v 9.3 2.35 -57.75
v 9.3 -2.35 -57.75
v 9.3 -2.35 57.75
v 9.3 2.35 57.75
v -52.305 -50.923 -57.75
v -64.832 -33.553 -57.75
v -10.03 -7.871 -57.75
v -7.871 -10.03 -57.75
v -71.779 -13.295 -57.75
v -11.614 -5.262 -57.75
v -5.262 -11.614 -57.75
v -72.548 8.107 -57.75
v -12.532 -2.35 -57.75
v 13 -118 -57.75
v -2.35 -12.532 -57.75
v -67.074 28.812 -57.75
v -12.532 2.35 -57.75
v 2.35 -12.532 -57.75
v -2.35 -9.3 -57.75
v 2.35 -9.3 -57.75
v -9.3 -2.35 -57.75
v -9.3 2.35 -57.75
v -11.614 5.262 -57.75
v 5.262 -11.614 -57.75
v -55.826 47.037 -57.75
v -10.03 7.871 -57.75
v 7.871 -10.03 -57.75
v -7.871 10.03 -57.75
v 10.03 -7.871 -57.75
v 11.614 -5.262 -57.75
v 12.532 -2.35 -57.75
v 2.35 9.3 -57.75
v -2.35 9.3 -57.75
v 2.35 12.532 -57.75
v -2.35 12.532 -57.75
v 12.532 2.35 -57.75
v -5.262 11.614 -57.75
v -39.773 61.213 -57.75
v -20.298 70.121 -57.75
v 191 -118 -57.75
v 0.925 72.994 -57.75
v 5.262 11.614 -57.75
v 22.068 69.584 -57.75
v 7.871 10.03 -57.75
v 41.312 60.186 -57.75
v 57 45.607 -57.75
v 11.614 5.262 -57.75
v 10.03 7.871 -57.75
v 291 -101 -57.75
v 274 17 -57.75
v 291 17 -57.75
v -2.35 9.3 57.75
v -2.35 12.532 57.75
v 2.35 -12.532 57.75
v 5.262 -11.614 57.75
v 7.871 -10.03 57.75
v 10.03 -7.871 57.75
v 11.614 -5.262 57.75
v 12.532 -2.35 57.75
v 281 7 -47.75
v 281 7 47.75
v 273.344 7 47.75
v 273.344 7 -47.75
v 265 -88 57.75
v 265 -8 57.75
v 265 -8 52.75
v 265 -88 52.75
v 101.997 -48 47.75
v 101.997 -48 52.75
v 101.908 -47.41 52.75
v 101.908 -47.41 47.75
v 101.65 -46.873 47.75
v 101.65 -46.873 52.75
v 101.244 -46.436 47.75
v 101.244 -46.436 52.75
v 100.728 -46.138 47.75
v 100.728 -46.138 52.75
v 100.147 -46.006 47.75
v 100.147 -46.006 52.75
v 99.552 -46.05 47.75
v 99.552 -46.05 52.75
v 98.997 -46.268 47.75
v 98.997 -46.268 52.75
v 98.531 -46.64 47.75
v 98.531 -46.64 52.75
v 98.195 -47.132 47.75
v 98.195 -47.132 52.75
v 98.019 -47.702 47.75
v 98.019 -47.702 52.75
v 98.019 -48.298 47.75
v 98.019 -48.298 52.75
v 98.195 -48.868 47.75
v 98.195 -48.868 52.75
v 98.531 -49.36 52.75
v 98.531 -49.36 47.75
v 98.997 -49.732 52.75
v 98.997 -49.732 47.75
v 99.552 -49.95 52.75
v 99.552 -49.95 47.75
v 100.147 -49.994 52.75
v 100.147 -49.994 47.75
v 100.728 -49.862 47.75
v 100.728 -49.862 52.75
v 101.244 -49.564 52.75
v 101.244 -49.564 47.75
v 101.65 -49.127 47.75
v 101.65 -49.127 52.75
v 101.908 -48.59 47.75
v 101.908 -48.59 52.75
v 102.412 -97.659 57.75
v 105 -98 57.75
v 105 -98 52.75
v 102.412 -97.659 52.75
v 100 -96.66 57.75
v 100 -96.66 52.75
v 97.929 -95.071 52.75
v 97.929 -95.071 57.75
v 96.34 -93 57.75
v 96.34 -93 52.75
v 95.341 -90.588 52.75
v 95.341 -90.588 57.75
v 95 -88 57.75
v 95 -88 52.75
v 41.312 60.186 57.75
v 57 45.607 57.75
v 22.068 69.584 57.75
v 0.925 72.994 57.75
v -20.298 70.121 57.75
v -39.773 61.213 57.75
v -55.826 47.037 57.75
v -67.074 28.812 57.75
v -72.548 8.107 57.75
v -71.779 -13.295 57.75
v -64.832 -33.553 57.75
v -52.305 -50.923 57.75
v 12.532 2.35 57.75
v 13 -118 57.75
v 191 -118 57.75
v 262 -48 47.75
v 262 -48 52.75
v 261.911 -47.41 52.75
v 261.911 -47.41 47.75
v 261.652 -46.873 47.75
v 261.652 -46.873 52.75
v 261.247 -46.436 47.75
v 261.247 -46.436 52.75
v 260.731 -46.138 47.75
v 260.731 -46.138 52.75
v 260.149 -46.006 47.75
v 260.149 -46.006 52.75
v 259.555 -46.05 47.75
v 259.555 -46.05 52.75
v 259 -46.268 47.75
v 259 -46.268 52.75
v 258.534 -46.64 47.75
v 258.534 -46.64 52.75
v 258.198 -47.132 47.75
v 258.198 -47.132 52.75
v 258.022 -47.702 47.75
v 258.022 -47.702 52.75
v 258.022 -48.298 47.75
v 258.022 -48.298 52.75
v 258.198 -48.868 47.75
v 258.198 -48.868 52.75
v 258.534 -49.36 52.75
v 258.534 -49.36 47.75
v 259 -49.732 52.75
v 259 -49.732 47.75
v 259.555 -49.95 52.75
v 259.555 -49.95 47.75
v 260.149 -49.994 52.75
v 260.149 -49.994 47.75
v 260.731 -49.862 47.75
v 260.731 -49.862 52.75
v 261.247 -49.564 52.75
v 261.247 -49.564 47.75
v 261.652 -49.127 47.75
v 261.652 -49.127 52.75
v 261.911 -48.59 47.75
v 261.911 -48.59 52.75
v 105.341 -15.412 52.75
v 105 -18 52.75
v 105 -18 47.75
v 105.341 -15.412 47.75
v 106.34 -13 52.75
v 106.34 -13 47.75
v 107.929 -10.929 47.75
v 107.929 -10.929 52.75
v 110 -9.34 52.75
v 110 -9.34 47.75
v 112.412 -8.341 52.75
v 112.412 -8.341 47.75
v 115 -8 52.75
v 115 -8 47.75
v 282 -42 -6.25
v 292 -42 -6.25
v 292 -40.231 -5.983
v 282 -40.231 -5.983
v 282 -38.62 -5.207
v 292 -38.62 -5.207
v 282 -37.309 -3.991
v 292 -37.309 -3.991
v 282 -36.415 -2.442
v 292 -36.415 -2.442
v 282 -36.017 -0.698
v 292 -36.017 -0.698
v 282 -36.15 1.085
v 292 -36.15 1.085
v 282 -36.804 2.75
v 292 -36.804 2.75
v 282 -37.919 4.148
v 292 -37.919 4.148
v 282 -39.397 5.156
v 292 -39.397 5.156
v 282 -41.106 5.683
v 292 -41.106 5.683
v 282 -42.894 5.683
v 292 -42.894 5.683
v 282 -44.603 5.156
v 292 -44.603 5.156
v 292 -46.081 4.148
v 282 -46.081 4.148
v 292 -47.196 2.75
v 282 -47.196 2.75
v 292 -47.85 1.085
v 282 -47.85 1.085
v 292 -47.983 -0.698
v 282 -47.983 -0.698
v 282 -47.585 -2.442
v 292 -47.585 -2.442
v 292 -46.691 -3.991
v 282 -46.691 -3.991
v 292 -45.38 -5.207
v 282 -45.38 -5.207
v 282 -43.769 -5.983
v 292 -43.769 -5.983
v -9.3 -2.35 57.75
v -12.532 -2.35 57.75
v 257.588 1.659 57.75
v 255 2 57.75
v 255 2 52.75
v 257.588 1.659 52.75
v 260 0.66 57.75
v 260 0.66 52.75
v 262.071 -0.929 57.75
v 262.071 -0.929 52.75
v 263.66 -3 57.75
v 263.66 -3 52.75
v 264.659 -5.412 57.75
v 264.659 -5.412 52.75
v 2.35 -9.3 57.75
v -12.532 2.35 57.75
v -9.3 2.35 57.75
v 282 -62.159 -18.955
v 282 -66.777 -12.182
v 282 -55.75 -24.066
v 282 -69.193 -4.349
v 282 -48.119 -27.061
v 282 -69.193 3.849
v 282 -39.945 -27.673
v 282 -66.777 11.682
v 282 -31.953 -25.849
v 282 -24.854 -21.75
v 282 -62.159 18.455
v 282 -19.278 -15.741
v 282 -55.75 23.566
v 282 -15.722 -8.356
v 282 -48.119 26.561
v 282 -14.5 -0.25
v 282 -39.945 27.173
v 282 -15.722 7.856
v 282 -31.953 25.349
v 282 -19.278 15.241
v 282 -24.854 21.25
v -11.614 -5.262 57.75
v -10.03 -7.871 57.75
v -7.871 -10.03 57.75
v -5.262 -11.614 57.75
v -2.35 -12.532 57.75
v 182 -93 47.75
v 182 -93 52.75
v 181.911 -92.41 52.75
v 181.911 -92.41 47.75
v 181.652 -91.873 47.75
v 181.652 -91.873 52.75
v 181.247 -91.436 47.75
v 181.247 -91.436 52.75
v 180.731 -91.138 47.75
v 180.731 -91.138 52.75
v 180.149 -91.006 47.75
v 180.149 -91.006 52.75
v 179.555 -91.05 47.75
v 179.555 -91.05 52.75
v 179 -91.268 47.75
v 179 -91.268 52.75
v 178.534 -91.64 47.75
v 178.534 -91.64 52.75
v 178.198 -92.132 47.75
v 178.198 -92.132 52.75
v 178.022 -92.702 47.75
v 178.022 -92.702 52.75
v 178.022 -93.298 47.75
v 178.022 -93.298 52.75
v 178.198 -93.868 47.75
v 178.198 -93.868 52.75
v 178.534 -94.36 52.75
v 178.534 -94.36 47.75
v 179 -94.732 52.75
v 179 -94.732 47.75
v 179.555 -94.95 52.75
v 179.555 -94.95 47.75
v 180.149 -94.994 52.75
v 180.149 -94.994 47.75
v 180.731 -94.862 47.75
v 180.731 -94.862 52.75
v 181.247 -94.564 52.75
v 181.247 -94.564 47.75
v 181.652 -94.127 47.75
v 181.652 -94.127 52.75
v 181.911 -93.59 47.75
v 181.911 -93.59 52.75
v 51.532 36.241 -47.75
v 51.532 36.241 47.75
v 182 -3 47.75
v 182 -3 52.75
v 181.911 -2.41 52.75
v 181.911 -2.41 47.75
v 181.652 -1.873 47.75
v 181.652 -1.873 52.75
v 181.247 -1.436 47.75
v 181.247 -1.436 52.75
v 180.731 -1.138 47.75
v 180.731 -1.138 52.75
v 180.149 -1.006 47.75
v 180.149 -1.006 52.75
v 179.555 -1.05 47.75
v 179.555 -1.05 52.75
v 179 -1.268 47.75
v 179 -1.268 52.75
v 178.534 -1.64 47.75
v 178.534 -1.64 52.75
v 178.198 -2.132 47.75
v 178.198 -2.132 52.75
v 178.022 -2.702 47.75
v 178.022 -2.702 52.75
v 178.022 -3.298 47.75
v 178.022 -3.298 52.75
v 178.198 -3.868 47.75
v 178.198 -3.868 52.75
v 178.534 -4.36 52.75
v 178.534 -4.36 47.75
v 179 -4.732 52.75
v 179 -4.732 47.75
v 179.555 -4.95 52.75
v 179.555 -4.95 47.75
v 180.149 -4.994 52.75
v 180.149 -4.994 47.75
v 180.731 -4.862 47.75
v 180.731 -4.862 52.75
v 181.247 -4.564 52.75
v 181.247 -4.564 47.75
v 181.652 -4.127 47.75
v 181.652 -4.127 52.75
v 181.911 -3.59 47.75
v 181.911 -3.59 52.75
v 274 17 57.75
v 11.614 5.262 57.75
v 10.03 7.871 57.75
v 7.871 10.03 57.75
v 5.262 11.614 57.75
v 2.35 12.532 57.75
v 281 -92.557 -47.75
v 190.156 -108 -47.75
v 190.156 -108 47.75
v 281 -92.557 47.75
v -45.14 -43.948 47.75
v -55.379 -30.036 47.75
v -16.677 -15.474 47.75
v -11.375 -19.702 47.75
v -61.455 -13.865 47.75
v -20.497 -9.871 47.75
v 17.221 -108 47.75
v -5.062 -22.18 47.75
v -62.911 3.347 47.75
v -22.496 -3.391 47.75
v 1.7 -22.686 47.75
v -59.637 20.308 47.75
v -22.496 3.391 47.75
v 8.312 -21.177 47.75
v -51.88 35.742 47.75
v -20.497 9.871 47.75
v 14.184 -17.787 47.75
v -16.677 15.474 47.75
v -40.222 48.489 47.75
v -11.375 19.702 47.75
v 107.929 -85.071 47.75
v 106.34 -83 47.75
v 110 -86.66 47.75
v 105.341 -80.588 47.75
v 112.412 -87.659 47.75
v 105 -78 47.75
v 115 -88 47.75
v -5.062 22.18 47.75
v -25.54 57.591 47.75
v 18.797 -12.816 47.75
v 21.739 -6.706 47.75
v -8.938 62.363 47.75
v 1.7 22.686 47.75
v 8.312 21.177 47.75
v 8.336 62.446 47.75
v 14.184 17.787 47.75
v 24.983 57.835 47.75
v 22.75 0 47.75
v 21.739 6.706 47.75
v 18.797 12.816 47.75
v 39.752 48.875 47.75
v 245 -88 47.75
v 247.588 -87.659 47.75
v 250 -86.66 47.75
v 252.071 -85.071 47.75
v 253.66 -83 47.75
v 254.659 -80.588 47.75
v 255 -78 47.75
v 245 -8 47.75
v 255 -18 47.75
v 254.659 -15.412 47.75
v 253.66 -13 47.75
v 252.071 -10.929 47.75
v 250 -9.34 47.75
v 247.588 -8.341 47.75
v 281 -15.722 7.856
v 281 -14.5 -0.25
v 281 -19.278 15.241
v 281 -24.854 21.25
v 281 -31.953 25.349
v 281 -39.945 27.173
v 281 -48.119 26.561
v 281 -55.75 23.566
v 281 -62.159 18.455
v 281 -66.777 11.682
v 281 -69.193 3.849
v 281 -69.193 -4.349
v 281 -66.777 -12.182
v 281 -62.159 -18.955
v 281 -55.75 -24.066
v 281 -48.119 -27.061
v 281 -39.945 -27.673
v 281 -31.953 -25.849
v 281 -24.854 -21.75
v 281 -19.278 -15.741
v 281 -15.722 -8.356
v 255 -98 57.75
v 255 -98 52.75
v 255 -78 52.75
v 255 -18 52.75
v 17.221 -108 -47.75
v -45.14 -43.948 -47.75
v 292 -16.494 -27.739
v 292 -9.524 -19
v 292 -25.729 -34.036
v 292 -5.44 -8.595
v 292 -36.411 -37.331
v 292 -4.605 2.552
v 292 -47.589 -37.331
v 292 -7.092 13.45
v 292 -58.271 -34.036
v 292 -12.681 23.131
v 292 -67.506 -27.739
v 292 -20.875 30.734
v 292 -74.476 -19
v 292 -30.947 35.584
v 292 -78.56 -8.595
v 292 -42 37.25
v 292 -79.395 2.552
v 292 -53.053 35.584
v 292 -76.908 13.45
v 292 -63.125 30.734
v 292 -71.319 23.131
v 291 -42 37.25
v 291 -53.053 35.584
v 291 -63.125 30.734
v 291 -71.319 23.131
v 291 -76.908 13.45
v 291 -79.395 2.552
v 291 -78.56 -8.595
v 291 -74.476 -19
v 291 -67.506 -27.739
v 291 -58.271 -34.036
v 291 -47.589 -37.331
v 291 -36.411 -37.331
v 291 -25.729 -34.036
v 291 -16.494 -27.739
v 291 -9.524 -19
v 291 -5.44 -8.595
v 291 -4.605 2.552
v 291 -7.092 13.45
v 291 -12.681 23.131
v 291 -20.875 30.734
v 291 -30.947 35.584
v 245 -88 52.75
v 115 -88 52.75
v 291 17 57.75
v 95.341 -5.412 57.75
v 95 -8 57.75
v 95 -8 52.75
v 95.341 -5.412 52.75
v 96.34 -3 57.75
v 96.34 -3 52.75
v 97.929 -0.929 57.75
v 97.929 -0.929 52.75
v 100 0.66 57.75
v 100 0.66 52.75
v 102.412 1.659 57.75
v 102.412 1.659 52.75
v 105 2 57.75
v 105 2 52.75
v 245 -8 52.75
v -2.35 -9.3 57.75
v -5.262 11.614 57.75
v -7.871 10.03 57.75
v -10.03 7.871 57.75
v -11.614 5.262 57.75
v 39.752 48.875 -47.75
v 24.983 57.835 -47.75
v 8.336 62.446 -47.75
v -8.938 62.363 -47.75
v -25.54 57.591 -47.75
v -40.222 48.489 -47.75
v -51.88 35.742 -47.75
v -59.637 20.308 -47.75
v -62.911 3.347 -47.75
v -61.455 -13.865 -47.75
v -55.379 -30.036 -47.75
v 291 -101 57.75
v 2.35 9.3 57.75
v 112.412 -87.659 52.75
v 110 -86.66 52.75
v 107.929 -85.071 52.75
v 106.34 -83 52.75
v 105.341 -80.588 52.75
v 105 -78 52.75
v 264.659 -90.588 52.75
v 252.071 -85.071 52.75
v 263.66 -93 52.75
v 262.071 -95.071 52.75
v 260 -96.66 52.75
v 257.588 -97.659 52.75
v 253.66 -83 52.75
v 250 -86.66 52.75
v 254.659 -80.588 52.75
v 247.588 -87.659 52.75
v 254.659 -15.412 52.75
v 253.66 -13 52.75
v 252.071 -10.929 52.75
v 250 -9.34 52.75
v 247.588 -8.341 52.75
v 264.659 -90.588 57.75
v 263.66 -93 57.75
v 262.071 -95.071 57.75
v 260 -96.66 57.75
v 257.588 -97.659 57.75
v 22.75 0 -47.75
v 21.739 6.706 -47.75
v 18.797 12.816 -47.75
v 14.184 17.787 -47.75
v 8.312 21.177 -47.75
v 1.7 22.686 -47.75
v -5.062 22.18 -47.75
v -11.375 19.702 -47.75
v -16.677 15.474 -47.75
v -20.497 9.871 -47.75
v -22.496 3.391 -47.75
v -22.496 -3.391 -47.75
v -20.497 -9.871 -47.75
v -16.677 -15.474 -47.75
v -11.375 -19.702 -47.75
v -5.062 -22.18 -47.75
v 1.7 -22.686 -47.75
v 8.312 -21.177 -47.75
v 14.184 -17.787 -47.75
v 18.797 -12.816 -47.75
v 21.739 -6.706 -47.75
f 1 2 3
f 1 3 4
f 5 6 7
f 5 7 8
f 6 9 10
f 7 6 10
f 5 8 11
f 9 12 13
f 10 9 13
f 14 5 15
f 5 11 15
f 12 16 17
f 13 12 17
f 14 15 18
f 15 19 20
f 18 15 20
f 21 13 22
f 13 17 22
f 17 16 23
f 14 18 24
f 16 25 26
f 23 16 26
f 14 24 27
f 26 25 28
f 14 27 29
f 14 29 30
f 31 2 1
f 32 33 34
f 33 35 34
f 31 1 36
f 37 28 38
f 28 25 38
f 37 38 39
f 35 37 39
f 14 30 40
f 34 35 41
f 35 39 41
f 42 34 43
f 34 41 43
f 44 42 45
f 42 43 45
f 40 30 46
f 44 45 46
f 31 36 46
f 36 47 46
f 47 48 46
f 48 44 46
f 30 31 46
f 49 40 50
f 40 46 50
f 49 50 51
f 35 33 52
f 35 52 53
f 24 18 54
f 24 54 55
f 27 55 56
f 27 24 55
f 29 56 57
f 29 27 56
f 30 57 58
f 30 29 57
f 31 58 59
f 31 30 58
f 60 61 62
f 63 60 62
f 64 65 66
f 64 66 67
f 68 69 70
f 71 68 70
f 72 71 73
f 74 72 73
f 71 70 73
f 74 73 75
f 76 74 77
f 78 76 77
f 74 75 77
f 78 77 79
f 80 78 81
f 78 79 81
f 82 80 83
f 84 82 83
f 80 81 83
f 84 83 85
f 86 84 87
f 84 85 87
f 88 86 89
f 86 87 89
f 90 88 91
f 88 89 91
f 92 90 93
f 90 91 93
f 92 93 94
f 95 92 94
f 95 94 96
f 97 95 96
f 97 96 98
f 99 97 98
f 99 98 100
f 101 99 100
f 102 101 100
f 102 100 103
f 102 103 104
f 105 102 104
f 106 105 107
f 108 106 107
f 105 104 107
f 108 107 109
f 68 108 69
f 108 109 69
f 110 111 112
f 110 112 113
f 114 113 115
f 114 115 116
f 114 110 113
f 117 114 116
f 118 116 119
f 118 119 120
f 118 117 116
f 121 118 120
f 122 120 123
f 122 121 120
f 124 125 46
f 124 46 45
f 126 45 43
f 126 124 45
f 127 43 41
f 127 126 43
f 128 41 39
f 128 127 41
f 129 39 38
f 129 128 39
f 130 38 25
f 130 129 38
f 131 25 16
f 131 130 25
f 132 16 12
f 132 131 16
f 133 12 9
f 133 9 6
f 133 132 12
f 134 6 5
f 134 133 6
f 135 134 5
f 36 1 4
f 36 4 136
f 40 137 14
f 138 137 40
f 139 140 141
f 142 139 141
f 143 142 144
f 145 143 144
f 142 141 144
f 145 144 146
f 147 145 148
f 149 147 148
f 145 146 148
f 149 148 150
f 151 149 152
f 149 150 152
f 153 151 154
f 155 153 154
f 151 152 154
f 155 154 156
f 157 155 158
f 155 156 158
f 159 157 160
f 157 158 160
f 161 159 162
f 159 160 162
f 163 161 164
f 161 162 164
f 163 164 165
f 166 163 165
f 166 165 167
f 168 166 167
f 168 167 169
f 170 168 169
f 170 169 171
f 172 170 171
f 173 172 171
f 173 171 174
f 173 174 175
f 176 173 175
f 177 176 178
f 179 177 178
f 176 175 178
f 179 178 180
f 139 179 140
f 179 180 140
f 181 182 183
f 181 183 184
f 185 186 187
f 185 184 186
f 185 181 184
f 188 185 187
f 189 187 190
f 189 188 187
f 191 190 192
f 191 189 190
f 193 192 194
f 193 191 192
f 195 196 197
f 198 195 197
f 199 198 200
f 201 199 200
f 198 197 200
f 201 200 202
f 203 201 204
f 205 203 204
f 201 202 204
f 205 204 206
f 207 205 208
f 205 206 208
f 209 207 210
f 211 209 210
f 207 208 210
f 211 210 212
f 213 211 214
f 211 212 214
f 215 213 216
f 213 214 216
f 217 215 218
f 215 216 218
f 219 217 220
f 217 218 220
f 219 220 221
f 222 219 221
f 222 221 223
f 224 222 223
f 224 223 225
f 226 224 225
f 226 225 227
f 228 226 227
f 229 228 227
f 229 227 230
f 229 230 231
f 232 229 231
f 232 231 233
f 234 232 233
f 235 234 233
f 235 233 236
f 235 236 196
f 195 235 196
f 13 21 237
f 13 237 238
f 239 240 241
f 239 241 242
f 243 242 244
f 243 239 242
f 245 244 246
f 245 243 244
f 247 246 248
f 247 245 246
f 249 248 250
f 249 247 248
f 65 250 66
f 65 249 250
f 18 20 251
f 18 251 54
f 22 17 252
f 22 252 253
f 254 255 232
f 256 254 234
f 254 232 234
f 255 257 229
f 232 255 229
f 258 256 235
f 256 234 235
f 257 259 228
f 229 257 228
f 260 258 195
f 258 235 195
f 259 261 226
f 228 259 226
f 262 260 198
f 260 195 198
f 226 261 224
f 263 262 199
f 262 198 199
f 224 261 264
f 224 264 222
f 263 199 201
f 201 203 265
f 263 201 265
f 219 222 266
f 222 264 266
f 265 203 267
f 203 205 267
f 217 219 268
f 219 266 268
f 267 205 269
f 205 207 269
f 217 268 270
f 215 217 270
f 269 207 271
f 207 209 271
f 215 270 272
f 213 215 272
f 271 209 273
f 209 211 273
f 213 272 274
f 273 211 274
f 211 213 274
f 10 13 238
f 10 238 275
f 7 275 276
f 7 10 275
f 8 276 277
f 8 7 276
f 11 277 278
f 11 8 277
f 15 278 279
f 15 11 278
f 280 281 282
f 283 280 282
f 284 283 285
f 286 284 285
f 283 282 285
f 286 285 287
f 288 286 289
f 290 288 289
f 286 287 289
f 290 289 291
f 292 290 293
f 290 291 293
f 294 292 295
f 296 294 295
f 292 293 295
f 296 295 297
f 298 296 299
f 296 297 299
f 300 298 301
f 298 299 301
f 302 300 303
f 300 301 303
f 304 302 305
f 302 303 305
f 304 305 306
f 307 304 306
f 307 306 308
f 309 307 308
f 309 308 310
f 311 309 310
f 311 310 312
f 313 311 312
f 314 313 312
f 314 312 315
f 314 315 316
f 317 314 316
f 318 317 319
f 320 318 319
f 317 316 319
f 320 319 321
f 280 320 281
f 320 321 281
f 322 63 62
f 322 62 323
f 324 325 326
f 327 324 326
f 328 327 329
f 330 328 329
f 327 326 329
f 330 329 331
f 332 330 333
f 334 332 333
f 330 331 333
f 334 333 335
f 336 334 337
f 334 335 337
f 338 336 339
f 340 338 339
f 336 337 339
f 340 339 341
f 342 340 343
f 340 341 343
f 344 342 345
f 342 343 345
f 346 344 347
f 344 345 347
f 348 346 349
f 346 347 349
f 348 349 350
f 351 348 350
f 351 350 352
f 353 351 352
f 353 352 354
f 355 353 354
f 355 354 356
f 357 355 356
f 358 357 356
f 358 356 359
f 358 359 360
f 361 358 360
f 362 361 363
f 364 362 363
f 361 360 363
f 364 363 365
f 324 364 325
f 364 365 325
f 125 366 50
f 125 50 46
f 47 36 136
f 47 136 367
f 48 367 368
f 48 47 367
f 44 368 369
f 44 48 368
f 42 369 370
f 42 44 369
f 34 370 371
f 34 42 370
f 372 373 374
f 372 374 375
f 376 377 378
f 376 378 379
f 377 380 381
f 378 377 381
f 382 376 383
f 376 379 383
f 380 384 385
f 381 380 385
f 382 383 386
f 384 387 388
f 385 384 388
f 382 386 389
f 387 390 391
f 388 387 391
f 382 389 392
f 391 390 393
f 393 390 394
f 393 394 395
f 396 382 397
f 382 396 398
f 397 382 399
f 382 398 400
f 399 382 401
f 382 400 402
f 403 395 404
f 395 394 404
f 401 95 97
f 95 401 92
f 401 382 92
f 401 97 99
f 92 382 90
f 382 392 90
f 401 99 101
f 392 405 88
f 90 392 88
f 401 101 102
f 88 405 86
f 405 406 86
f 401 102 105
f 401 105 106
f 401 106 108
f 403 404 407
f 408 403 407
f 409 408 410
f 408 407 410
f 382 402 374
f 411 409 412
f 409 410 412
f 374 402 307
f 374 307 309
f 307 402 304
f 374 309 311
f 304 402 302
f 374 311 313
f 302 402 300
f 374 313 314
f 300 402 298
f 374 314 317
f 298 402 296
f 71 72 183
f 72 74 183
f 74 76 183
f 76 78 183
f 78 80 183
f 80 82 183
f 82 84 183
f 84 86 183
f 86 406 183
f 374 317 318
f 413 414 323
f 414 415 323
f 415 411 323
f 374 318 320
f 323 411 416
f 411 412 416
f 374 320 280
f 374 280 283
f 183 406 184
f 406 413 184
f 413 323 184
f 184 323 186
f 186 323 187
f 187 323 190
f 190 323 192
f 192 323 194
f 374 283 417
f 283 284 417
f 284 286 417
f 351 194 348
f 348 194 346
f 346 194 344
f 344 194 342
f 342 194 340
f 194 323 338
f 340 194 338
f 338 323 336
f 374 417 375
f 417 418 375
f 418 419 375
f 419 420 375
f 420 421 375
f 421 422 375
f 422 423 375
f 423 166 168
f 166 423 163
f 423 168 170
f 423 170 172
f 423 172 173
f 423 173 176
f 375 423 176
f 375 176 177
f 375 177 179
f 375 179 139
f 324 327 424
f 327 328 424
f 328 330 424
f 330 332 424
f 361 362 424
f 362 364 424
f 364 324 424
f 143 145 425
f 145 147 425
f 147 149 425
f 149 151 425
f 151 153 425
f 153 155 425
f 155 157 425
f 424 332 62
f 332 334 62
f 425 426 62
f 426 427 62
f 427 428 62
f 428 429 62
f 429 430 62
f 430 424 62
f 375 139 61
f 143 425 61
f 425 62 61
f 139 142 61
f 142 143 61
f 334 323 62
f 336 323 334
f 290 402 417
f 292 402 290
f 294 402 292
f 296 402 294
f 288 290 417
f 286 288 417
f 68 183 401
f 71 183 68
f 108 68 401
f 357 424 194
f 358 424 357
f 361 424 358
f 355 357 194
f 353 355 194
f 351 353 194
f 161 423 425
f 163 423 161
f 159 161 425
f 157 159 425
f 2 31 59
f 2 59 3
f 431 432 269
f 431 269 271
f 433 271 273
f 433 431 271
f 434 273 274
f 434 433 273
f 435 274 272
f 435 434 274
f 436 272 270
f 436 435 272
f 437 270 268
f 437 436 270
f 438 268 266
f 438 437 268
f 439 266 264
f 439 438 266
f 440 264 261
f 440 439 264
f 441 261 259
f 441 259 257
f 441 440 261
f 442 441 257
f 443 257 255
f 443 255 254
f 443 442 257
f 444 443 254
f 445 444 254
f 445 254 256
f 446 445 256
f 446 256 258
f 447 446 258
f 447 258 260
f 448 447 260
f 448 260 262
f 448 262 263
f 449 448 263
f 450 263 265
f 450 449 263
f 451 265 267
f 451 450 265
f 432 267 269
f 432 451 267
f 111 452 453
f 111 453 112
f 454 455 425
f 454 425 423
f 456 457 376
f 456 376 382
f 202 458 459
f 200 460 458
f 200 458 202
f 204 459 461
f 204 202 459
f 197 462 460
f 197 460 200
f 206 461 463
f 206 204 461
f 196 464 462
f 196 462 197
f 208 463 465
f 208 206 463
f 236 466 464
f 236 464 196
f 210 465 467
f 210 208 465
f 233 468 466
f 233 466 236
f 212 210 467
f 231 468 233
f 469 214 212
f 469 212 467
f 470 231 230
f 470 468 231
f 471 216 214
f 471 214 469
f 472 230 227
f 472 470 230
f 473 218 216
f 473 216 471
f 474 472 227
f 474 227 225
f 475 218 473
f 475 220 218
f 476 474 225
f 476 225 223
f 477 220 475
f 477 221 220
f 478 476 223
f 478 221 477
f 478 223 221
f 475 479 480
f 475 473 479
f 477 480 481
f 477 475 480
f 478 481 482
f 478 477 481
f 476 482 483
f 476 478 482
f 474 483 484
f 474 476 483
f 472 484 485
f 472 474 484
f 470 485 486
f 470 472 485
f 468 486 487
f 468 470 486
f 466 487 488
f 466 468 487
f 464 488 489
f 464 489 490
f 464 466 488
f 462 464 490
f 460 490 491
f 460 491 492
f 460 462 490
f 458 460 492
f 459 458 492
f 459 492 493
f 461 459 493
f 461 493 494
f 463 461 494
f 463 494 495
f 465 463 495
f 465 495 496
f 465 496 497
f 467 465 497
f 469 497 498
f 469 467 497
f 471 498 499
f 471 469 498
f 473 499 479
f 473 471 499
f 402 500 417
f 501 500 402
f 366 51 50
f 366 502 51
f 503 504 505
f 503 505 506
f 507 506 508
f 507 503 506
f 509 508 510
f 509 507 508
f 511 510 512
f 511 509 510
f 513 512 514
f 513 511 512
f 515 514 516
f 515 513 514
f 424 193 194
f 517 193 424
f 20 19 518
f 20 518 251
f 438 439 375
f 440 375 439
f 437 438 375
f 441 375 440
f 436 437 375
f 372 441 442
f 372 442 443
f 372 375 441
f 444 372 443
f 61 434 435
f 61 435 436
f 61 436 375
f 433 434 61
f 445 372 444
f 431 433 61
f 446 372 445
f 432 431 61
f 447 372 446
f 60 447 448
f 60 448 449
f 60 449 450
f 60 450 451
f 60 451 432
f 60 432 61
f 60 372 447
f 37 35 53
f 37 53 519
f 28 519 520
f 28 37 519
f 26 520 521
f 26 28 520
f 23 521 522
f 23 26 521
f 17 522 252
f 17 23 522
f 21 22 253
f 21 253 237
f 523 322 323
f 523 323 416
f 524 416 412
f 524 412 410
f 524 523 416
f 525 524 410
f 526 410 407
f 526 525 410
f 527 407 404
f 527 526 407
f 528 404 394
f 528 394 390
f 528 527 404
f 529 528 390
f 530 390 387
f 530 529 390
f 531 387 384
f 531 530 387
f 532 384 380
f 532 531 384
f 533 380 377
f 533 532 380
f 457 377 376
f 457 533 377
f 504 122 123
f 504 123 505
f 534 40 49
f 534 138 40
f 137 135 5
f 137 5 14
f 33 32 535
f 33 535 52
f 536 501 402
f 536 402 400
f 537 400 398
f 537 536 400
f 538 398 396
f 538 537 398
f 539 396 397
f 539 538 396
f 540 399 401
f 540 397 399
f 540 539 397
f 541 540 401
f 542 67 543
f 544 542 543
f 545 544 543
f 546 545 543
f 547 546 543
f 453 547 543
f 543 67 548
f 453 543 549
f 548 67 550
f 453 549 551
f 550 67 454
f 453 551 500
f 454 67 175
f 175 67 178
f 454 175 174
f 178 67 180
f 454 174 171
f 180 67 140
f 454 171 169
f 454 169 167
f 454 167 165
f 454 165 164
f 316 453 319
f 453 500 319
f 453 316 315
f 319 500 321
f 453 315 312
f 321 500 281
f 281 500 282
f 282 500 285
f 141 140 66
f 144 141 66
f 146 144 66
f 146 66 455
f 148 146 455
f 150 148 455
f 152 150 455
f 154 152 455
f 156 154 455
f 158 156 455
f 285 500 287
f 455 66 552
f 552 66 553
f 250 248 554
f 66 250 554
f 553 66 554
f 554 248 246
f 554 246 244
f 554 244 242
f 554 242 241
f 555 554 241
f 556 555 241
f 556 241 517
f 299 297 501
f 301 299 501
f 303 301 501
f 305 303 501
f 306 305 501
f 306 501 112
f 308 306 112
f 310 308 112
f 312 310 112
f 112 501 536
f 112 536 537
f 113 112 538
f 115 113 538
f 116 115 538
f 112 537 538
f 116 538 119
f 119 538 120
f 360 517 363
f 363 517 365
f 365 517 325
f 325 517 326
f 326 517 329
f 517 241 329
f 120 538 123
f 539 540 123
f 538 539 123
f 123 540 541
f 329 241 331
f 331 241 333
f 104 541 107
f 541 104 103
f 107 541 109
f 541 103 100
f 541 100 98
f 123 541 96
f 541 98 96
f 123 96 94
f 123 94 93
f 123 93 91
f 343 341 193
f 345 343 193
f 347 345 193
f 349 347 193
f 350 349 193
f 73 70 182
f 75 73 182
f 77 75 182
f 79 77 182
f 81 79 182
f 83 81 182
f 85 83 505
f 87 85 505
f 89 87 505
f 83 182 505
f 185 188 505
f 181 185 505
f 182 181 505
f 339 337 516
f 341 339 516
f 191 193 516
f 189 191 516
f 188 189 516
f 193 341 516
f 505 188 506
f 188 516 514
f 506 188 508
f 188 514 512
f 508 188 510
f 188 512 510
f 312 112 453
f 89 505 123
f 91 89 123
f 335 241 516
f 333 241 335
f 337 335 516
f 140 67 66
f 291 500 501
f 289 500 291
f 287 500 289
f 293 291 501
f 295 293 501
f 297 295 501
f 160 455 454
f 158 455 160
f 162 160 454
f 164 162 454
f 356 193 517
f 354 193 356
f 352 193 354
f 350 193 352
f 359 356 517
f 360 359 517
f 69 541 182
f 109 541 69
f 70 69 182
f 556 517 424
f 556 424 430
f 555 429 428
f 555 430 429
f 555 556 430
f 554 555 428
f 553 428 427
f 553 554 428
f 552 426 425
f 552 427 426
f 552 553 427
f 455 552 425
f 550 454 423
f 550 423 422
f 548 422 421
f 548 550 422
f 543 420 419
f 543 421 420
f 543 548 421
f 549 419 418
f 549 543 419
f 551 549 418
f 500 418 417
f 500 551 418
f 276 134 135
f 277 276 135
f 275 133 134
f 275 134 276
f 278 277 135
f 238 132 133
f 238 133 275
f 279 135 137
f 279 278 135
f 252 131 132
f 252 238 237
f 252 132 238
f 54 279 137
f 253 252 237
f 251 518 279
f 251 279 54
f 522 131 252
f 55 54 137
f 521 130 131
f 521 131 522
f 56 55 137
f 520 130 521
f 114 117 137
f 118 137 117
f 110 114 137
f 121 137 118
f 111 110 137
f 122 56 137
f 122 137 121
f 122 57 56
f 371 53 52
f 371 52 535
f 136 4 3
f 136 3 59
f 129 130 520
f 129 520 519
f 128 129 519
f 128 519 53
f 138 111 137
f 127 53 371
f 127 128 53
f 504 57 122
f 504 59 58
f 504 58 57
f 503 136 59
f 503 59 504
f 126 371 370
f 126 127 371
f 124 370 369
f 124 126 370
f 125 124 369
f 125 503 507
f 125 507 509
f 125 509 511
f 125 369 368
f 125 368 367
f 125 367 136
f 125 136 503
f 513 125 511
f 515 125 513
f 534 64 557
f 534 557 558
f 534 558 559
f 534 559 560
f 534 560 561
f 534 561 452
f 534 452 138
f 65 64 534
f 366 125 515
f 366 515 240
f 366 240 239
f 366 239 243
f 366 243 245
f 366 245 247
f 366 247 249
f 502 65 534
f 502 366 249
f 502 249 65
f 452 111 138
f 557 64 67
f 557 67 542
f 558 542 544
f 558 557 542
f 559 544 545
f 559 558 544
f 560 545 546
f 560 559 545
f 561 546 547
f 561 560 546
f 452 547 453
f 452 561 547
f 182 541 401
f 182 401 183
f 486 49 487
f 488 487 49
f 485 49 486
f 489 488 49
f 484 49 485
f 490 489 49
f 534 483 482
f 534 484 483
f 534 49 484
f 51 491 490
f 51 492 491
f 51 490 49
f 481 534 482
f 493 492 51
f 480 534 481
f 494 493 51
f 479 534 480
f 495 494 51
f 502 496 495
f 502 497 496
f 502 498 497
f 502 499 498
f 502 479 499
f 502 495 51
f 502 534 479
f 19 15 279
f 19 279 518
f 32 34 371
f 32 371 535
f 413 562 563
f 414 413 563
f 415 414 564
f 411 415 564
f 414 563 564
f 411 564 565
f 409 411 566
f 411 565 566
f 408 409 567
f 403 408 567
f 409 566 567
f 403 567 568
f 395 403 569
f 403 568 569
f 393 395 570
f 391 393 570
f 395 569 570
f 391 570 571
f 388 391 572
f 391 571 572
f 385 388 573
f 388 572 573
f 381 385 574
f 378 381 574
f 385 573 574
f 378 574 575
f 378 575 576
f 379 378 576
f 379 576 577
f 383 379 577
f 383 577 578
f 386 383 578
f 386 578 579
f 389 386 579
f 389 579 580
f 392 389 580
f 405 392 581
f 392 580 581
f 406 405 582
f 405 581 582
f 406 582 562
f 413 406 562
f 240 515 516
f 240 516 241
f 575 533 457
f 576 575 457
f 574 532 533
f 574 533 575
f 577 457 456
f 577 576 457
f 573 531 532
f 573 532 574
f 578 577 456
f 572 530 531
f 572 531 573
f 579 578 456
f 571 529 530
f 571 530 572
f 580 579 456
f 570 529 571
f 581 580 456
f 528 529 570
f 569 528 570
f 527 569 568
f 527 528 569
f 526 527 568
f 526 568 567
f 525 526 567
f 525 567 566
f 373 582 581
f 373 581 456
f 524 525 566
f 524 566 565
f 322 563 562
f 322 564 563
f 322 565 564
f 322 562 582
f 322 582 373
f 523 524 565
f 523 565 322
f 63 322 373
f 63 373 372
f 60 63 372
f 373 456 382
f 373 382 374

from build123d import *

# Parameters (mm, degrees)
RESSALTO_EXTRUS_O1_DEPTH = 57.75
ESBO_O2_R                = 37.5
RESSALTO_EXTRUS_O2_DEPTH = 1
CORTE_EXTRUS_O1_DEPTH    = 336.452306595
CASCA1_START             = -47.75
CASCA1_OUTLINE_R         = 22.75
CASCA1_DEPTH             = 95.5
CASCA1_START_2           = 281
CASCA1_2_OUTLINE_R       = 27.5
CASCA1_2_DEPTH           = 1
CORTE_EXTRUS_O2_REACH    = 389.923
ESBO_O6_R                = 6
CORTE_EXTRUS_O3_REACH    = 337.452
CORTE_EXTRUS_O4_DEPTH    = 5
ESBO_O9_R                = 2
CORTE_EXTRUS_O5_DEPTH    = 5


with BuildPart() as part:
    # Esboço1 → Ressalto-extrusão1 (new, symmetric)
    with BuildSketch(Plane.XY):
        with BuildLine():
            Line((291, 0), (291, 17))
            Line((291, 17), (274, 17))
            Line((274, 17), (57, 45.607017004))
            ThreePointArc((57, 45.607017004), (-48.32227677, 54.71706834), (-52.304922539, -50.92342367))
            Line((-52.304922539, -50.92342367), (13, -118))
            Line((13, -118), (191, -118))
            Line((191, -118), (291, -101))
            Line((291, -101), (291, 0))
        make_face()
    extrude(amount=RESSALTO_EXTRUS_O1_DEPTH, both=True)

    # Esboço2 → Ressalto-extrusão2 (add, symmetric)
    with BuildSketch(Plane(origin=(291, 0, 0), x_dir=(0, 0, -1), z_dir=(1, 0, 0))):
        with Locations(Location((0.25, -42, 0), (0, 0, 180))):
            Circle(ESBO_O2_R)
    extrude(amount=RESSALTO_EXTRUS_O2_DEPTH, both=True)

    # Esboço4 → Corte-extrusão1 (cut, through all)
    with BuildSketch(Plane(origin=(0, 0, -57.75), x_dir=(-1, 0, 0), z_dir=(0, 0, -1))):
        with BuildLine():
            Line((-2.35, 9.3), (2.35, 9.3))
            Line((2.35, 9.3), (2.35, 12.531560158))
            ThreePointArc((2.35, 12.531560158), (9.01561146, 9.01561146), (12.531560158, 2.35))
            Line((12.531560158, 2.35), (9.3, 2.35))
            Line((9.3, 2.35), (9.3, -2.35))
            Line((9.3, -2.35), (12.531560158, -2.35))
            ThreePointArc((12.531560158, -2.35), (9.01561146, -9.01561146), (2.35, -12.531560158))
            Line((2.35, -12.531560158), (2.35, -9.3))
            Line((2.35, -9.3), (-2.35, -9.3))
            Line((-2.35, -9.3), (-2.35, -12.531560158))
            ThreePointArc((-2.35, -12.531560158), (-9.01561146, -9.01561146), (-12.531560158, -2.35))
            Line((-12.531560158, -2.35), (-9.3, -2.35))
            Line((-9.3, -2.35), (-9.3, 2.35))
            Line((-9.3, 2.35), (-12.531560158, 2.35))
            ThreePointArc((-12.531560158, 2.35), (-9.01561146, 9.01561146), (-2.35, 12.531560158))
            Line((-2.35, 12.531560158), (-2.35, 9.3))
        make_face()
    extrude(amount=-CORTE_EXTRUS_O1_DEPTH, mode=Mode.SUBTRACT)

    # Casca1: read off the stored shape, not the designer's step
    # Casca1 outline → Casca1 (cut)
    with BuildSketch(Plane.XY.offset(CASCA1_START)):
        with BuildLine():
            ThreePointArc((51.532195013, 36.241314506), (-40.221654164, 48.489365187), (-45.139864657, -43.947612208))
            Line((-45.139864657, -43.947612208), (17.22074544, -108))
            Line((17.22074544, -108), (190.15605408, -108))
            Line((190.15605408, -108), (281, -92.556529194))
            Line((281, -92.556529194), (281, 7))
            Line((281, 7), (273.343691363, 7))
            Line((273.343691363, 7), (51.532195013, 36.241314506))
        make_face()
        Circle(CASCA1_OUTLINE_R, mode=Mode.SUBTRACT)
    extrude(amount=CASCA1_DEPTH, mode=Mode.SUBTRACT)

    # Casca1 2 outline → Casca1 2 (cut)
    with BuildSketch(Plane.YZ.offset(CASCA1_START_2)):
        with Locations((-42, -0.25)):
            Circle(CASCA1_2_OUTLINE_R)
    extrude(amount=CASCA1_2_DEPTH, mode=Mode.SUBTRACT)

    # Esboço6 → Corte-extrusão2 (cut, up to next)
    with BuildSketch(Plane(origin=(292, 0, 0), x_dir=(0, 0, -1), z_dir=(1, 0, 0)), mode=Mode.PRIVATE) as corte_extrus_o2_sk1:
        with Locations((0.25, -42)):
            Circle(ESBO_O6_R)
    corte_extrus_o2_tool1 = extrude(corte_extrus_o2_sk1.sketch, amount=-CORTE_EXTRUS_O2_REACH, mode=Mode.PRIVATE) & part.part
    add(corte_extrus_o2_tool1.solids().sort_by_distance((292, -42, -0.25))[0], mode=Mode.SUBTRACT)

    # Esboço7 → Corte-extrusão3 (cut, up to next)
    with BuildSketch(Plane.XY.offset(57.75), mode=Mode.PRIVATE) as corte_extrus_o3_sk1:
        with BuildLine():
            Line((245, -88), (115, -88))
            ThreePointArc((115, -88), (107.928932188, -85.071067812), (105, -78))
            Line((105, -78), (105, -18))
            ThreePointArc((105, -18), (107.928932188, -10.928932188), (115, -8))
            Line((115, -8), (245, -8))
            ThreePointArc((245, -8), (252.071067812, -10.928932188), (255, -18))
            Line((255, -18), (255, -78))
            ThreePointArc((255, -78), (252.071067812, -85.071067812), (245, -88))
        make_face()
    corte_extrus_o3_tool1 = extrude(corte_extrus_o3_sk1.sketch, amount=-CORTE_EXTRUS_O3_REACH, mode=Mode.PRIVATE) & part.part
    add(corte_extrus_o3_tool1.solids().sort_by_distance((180, -48, 57.75))[0], mode=Mode.SUBTRACT)

    # Esboço8 → Corte-extrusão4 (cut)
    with BuildSketch(Plane.XY.offset(57.75)):
        with BuildLine():
            Line((255, -98), (105, -98))
            ThreePointArc((105, -98), (97.928932188, -95.071067812), (95, -88))
            Line((95, -88), (95, -8))
            ThreePointArc((95, -8), (97.928932188, -0.928932188), (105, 2))
            Line((105, 2), (255, 2))
            ThreePointArc((255, 2), (262.071067812, -0.928932188), (265, -8))
            Line((265, -8), (265, -88))
            ThreePointArc((265, -88), (262.071067812, -95.071067812), (255, -98))
        make_face()
    extrude(amount=-CORTE_EXTRUS_O4_DEPTH, mode=Mode.SUBTRACT)

    # Esboço9 → Corte-extrusão5 (cut)
    with BuildSketch(Plane.XY.offset(52.75)):
        with Locations((180, -3)):
            Circle(ESBO_O9_R)
        with Locations((260, -48)):
            Circle(ESBO_O9_R)
        with Locations((180, -93)):
            Circle(ESBO_O9_R)
        with Locations((99.997152321, -48)):
            Circle(ESBO_O9_R)
    extrude(amount=-CORTE_EXTRUS_O5_DEPTH, mode=Mode.SUBTRACT)


solid = part.part
